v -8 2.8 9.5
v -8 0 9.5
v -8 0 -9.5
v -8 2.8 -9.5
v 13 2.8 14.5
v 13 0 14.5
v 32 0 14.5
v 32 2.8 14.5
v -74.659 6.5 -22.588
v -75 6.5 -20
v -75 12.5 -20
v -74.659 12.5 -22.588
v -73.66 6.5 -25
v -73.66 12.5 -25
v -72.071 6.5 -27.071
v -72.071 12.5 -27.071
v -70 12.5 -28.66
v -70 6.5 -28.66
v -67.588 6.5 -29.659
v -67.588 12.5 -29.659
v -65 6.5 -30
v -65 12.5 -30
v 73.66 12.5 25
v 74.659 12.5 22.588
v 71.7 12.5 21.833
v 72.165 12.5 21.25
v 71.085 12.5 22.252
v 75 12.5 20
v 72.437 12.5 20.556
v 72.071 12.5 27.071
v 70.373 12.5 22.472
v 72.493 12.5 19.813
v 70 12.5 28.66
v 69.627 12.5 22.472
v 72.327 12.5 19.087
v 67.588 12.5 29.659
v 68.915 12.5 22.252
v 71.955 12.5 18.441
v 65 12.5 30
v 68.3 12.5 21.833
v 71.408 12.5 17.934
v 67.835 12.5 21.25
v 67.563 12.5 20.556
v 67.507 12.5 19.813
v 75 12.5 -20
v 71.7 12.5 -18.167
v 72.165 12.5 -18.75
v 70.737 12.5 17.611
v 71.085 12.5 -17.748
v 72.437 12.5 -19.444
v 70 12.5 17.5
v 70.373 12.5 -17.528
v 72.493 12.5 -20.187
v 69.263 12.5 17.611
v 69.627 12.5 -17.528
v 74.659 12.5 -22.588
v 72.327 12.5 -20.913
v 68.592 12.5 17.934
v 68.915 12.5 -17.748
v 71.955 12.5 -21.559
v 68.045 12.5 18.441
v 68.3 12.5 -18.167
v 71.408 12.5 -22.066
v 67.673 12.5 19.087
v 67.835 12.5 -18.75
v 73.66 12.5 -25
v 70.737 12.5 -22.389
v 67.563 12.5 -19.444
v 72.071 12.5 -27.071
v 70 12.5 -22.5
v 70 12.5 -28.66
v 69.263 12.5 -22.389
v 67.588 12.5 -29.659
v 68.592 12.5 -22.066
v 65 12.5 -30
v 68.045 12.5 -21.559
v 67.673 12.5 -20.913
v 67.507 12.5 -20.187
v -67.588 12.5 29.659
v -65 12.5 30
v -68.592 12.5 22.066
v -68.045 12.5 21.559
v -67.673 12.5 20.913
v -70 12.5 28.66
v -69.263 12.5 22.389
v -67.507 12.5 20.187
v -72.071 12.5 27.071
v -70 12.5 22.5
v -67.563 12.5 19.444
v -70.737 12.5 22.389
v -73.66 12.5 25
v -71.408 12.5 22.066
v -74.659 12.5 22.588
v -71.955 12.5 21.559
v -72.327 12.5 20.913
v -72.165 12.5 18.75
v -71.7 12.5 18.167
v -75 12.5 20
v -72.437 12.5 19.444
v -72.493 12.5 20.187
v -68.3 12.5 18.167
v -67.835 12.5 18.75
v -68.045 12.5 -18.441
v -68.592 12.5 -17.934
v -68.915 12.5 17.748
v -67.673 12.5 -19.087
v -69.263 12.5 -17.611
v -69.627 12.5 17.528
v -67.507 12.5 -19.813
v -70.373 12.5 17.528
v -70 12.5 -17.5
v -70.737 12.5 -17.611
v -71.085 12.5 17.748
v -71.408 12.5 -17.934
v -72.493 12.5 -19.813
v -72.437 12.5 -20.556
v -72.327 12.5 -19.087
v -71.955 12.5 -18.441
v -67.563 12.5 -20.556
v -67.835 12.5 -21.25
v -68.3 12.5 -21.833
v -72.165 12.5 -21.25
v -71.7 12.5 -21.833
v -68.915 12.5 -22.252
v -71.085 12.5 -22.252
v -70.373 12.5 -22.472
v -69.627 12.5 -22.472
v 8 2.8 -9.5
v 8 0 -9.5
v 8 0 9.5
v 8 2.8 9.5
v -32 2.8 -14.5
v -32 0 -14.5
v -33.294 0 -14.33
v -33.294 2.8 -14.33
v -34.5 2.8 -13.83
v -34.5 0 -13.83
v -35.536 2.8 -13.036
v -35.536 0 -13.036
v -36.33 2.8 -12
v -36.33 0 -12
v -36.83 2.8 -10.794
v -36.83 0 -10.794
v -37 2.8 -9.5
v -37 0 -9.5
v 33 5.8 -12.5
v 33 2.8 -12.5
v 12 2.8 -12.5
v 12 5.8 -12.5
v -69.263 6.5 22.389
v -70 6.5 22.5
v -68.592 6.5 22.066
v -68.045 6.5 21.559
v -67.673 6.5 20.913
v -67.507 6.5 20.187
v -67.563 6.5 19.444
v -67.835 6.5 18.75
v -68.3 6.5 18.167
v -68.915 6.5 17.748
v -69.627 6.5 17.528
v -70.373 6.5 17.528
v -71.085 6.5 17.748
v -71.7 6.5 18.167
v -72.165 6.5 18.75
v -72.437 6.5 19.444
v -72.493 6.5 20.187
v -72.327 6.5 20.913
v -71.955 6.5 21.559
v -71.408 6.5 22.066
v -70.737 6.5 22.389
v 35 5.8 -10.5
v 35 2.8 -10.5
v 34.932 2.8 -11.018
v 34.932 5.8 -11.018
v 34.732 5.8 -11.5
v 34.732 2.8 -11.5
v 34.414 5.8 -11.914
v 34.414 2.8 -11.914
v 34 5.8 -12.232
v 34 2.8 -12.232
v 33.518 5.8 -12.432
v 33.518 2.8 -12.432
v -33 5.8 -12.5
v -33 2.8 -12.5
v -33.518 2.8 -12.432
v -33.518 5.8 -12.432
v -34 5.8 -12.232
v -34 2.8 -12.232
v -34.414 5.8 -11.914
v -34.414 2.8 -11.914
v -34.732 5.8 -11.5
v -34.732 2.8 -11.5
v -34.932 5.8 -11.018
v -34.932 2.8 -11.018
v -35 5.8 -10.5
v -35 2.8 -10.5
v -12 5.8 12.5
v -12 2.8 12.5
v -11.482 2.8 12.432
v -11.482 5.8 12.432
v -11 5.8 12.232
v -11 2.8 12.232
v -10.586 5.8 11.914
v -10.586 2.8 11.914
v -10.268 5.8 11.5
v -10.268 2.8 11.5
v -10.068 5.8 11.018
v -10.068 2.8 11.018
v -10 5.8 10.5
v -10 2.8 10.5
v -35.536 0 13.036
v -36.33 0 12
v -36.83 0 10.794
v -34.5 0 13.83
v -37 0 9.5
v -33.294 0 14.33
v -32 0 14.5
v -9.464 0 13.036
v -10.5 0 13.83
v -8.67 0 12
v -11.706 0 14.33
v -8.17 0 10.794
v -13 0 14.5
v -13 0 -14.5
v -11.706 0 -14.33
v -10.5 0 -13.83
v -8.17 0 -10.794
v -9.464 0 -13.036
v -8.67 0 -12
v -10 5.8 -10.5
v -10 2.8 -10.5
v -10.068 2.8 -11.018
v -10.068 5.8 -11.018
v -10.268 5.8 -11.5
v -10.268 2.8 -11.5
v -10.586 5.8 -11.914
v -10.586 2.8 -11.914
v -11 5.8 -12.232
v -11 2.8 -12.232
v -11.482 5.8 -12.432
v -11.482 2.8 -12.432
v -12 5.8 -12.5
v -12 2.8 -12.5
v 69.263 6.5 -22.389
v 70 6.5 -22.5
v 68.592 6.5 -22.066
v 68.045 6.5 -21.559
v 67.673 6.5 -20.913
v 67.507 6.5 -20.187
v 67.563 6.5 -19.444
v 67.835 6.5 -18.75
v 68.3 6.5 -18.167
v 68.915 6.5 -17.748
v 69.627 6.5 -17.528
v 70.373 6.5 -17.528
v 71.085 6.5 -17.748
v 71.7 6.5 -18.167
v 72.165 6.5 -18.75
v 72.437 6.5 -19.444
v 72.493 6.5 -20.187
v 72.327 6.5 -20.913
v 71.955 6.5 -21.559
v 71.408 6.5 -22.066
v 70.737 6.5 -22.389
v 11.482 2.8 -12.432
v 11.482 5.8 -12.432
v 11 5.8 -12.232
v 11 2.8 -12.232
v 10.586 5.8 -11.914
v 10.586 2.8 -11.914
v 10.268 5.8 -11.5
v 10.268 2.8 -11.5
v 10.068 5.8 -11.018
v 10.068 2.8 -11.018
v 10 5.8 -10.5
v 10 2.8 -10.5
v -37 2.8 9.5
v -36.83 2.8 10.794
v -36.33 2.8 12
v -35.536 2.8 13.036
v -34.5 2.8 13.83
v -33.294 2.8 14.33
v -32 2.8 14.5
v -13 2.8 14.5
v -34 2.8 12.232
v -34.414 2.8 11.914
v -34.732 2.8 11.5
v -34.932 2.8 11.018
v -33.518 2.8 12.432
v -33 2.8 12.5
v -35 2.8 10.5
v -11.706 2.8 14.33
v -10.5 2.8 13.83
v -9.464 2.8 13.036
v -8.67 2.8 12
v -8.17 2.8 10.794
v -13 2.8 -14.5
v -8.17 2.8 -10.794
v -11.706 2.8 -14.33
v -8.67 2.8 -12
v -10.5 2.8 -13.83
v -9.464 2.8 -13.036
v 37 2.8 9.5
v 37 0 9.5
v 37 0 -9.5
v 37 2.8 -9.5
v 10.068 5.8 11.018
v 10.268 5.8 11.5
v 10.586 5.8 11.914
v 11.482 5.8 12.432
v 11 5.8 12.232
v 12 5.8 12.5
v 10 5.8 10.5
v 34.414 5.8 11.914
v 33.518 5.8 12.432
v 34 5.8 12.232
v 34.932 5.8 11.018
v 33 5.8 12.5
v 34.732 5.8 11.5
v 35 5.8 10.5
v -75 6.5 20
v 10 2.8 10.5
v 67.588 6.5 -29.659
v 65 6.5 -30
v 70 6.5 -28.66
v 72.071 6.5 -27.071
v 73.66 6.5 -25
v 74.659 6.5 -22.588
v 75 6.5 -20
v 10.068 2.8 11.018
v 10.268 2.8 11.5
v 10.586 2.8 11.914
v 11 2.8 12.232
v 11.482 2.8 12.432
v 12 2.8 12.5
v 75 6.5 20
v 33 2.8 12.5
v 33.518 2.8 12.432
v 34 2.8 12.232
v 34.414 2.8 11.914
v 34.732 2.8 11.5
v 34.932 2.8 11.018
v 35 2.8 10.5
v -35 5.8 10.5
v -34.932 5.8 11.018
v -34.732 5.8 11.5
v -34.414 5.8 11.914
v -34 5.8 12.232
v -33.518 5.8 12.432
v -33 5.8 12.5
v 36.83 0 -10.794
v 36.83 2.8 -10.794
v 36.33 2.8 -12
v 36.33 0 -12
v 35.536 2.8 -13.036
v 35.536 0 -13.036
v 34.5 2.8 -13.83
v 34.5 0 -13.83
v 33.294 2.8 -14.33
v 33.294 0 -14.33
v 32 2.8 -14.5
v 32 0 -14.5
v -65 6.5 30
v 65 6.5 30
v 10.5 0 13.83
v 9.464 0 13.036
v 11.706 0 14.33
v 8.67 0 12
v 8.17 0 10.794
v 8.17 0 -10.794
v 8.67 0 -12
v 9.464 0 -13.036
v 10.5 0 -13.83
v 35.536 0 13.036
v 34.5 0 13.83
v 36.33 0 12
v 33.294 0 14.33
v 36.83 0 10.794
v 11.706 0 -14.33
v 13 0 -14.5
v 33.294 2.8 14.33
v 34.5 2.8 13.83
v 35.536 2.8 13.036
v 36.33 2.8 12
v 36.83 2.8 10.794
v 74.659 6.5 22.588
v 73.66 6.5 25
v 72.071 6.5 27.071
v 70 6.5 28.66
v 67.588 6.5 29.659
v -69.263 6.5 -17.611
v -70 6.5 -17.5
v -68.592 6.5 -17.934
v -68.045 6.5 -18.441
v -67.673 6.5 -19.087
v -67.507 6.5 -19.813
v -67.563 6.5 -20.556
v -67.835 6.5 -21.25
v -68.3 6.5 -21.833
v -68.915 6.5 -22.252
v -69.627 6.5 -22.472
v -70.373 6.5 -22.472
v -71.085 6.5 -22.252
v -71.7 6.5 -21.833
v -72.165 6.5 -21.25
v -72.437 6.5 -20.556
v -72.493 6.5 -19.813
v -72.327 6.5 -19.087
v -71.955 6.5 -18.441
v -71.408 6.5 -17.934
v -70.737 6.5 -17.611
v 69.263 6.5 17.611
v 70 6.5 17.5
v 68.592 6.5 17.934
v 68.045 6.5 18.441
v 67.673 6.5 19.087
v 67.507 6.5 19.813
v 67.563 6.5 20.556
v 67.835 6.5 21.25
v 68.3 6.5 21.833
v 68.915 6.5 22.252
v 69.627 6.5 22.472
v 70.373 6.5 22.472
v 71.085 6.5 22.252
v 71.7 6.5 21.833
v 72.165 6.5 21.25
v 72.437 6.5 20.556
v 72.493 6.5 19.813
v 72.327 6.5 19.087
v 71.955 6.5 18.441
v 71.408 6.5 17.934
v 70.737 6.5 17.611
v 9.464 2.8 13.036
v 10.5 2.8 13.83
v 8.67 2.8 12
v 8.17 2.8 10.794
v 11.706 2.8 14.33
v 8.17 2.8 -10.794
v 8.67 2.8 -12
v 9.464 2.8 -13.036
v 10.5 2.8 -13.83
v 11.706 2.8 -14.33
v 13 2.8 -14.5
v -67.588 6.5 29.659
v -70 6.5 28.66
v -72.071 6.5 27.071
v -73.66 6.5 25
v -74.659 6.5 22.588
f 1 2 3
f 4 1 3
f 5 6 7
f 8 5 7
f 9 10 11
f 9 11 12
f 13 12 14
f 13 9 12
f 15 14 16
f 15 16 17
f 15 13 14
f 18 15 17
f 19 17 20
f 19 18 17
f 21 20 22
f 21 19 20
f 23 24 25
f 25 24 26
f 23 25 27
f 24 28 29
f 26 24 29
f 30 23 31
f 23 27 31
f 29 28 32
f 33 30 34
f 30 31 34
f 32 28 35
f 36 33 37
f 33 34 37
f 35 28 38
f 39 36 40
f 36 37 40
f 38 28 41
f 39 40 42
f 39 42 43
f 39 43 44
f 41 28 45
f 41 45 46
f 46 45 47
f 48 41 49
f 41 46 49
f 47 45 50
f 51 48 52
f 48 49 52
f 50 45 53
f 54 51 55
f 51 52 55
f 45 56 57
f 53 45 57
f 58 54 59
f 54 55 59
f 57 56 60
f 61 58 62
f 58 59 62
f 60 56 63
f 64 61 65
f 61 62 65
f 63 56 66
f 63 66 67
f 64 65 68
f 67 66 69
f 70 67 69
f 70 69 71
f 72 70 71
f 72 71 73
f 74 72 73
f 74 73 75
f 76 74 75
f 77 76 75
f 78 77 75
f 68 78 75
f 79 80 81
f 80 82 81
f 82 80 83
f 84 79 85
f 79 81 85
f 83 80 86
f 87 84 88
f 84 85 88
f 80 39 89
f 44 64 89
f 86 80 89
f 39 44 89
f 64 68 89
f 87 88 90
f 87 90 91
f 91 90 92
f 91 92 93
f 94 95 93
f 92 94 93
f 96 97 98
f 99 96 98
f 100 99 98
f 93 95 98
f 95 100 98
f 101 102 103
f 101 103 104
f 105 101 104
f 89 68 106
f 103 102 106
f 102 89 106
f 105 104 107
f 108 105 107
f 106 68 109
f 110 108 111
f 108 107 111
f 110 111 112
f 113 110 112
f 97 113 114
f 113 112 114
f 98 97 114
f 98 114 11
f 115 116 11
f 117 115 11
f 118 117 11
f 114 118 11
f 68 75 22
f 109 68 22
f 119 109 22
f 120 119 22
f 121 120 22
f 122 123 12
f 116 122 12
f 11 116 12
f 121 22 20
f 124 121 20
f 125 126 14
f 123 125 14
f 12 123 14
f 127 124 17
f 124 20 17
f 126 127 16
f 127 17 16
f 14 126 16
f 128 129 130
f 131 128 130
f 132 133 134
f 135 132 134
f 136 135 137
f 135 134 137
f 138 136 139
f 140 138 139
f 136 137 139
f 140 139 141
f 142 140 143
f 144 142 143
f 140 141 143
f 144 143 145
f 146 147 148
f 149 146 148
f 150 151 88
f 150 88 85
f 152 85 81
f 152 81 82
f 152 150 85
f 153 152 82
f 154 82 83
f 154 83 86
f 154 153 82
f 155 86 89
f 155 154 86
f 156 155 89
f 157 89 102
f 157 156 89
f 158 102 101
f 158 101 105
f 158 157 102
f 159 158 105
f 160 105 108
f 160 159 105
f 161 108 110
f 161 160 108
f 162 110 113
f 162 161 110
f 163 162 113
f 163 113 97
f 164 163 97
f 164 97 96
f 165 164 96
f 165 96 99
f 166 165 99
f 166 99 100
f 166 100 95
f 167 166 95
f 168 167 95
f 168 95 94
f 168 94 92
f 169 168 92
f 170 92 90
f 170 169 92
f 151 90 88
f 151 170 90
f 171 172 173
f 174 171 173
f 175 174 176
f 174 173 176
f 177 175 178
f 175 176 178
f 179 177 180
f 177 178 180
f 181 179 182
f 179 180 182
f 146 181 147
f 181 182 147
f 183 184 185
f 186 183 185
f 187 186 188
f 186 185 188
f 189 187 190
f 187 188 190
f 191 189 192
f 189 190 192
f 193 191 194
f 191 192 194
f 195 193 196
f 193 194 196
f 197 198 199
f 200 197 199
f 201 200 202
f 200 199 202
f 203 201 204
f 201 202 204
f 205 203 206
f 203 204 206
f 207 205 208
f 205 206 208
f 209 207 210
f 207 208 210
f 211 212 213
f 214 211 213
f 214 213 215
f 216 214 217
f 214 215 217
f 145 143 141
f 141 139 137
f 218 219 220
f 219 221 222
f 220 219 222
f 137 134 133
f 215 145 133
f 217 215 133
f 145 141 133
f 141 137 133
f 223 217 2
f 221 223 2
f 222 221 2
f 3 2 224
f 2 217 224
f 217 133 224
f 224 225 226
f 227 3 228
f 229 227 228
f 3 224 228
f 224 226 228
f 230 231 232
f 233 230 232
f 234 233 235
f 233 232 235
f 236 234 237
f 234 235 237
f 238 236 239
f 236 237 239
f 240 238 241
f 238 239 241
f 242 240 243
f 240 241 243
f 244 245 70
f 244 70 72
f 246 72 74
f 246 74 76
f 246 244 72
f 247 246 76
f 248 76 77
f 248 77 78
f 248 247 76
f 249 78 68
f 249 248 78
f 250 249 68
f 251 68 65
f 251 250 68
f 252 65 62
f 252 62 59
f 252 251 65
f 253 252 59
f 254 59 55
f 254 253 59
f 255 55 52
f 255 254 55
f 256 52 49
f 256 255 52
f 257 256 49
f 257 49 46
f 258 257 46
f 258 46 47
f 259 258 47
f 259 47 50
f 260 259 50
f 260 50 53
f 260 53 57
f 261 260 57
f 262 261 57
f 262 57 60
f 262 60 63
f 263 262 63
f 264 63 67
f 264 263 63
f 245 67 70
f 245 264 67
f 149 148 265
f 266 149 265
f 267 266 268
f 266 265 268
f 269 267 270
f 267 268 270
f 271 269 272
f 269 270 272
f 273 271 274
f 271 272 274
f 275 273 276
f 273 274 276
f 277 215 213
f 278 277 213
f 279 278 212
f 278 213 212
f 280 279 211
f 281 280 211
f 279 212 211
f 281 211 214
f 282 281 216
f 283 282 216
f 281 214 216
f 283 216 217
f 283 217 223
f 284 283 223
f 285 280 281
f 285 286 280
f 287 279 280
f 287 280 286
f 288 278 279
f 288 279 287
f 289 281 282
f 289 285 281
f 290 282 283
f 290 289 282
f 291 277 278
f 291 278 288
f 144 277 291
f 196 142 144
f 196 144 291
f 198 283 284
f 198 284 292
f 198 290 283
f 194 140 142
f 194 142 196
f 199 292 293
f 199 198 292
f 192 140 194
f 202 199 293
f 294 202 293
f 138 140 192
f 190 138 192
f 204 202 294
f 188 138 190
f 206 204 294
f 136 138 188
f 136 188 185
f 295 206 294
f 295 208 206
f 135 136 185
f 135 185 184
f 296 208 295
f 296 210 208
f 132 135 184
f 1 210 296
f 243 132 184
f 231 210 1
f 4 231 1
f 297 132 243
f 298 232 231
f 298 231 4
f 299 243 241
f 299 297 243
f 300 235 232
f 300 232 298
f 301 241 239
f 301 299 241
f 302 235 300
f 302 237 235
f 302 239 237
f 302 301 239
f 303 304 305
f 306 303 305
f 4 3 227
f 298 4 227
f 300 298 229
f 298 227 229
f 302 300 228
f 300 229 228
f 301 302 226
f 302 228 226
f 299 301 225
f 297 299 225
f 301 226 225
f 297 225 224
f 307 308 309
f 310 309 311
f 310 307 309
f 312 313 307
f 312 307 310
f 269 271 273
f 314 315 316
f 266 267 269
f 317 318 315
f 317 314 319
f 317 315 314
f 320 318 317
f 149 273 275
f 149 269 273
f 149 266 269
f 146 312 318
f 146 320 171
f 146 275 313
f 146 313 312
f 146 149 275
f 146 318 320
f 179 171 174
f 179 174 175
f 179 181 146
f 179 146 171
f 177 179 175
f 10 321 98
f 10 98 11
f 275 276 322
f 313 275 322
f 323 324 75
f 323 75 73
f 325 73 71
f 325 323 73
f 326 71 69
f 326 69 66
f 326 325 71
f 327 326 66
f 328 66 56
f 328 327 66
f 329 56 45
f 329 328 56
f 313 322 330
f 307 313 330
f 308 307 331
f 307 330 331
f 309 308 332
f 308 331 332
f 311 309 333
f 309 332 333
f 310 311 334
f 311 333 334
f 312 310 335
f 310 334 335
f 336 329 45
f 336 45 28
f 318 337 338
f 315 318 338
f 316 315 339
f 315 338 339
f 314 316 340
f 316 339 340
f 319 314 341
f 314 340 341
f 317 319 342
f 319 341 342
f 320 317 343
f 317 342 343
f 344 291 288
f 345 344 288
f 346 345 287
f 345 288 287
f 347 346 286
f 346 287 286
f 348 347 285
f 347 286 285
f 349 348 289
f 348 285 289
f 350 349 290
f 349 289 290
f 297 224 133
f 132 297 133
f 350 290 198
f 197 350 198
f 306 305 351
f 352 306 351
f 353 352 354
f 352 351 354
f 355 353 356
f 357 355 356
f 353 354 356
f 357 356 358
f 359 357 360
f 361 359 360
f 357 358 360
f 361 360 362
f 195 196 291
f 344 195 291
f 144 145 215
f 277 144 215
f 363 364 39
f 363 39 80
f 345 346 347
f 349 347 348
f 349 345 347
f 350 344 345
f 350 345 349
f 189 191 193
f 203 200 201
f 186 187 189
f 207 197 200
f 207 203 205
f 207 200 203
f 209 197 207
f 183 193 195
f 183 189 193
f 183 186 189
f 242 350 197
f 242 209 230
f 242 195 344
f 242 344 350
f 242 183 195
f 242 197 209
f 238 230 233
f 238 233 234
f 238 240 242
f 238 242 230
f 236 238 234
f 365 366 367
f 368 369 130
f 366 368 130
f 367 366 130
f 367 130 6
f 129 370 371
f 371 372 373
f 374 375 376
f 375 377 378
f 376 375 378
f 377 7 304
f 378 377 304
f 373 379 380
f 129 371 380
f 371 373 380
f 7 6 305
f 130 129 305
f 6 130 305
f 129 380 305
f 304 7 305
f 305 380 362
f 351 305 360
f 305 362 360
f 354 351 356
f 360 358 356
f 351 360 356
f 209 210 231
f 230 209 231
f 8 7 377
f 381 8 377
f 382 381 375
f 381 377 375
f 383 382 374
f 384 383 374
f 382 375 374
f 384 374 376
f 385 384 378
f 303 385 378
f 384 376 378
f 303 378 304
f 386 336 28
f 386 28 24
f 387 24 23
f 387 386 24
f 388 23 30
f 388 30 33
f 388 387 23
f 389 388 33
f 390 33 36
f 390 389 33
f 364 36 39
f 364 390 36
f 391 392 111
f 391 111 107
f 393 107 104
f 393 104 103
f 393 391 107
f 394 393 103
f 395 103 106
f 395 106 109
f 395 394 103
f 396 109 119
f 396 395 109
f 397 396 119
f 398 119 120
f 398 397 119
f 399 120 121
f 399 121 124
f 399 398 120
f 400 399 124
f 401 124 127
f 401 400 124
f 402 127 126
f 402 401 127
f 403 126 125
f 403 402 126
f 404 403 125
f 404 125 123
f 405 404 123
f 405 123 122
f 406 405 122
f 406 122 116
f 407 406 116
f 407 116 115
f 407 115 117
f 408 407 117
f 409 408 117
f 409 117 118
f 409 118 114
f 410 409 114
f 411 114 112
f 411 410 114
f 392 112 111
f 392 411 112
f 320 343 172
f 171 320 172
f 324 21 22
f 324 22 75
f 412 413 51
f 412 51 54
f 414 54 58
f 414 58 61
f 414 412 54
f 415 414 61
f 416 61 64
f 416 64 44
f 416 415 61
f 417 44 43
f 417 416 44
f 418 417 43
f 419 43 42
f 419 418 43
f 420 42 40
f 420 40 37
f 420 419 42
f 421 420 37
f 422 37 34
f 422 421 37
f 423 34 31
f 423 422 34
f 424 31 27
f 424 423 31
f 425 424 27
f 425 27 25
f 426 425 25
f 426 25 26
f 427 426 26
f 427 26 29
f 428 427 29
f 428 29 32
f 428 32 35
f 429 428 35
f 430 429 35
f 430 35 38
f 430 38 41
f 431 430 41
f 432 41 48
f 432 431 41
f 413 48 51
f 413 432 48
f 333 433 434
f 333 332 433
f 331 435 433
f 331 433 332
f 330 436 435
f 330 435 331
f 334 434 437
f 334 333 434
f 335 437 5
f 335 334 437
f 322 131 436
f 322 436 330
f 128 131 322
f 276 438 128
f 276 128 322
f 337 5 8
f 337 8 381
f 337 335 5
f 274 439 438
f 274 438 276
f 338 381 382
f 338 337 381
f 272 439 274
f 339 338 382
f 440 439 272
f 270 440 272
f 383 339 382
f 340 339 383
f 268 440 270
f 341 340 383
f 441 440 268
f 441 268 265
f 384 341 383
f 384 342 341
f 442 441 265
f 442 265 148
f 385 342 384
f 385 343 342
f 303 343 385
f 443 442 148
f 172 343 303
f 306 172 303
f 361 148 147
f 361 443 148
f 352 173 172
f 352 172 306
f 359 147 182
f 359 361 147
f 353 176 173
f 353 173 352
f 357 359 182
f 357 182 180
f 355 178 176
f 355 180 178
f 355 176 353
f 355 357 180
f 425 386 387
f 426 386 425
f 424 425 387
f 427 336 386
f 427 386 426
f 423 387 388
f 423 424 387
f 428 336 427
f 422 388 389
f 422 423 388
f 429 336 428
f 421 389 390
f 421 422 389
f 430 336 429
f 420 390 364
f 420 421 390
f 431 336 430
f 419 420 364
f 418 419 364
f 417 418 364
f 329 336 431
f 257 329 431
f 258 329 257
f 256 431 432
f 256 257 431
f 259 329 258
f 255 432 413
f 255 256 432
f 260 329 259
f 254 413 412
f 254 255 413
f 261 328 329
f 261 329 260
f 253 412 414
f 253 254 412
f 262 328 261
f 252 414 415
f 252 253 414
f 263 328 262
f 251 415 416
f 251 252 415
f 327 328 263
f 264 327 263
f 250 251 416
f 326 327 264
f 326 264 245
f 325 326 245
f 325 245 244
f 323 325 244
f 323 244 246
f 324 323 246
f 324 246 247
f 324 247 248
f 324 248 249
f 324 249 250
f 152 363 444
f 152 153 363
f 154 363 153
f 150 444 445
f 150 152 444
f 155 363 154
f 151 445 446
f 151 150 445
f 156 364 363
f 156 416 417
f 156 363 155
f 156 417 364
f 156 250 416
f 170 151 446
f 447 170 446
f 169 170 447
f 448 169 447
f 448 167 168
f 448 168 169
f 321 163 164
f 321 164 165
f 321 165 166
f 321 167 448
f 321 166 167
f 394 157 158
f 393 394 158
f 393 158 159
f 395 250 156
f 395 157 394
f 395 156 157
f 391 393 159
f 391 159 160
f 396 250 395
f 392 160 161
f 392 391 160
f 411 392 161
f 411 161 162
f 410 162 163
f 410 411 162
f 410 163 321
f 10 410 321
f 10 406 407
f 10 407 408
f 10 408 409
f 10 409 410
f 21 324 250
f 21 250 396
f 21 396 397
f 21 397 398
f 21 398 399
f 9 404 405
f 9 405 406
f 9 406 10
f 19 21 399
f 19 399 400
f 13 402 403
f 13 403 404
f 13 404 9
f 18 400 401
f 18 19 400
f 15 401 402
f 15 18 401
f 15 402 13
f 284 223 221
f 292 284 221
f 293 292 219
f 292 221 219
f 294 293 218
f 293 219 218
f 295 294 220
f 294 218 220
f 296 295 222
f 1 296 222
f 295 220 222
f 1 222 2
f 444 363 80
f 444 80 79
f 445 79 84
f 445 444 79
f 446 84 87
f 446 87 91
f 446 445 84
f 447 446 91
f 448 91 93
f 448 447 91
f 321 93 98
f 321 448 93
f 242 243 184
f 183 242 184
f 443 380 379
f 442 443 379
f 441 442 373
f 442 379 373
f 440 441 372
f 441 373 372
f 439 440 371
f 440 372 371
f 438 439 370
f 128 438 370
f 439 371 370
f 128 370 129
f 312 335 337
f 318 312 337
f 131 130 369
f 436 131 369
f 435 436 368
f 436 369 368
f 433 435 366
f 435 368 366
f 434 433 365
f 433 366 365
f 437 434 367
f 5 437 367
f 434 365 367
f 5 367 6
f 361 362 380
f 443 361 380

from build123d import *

# Parameters (mm, degrees)
SALIENTE_EXTRUIR1_DEPTH   = 2.8
SALIENTE_EXTRUIR1_2_DEPTH = 2.8
SALIENTE_EXTRUIR2_DEPTH   = 3
CROQUIS3_R                = 2.5
SALIENTE_EXTRUIR3_DEPTH   = 6


with BuildPart() as part:
    # Croquis1 → Saliente-Extruir1 (new body)
    with BuildSketch(Plane(origin=(0, 0, 0), x_dir=(1, 0, 0), z_dir=(0, 1, 0))):
        with BuildLine():
            Line((-32, -14.5), (-13, -14.5))
            ThreePointArc((-13, -14.5), (-9.464466094, -13.035533906), (-8, -9.5))
            Line((-8, -9.5), (-8, 9.5))
            ThreePointArc((-8, 9.5), (-9.464466094, 13.035533906), (-13, 14.5))
            Line((-13, 14.5), (-32, 14.5))
            ThreePointArc((-32, 14.5), (-35.535533906, 13.035533906), (-37, 9.5))
            Line((-37, 9.5), (-37, -9.5))
            ThreePointArc((-37, -9.5), (-35.535533906, -13.035533906), (-32, -14.5))
        make_face()
    extrude(amount=SALIENTE_EXTRUIR1_DEPTH)



with BuildPart() as body_2:
    # Croquis1 → Saliente-Extruir1 2 (new body)
    with BuildSketch(Plane(origin=(0, 0, 0), x_dir=(1, 0, 0), z_dir=(0, 1, 0))):
        with BuildLine():
            Line((13, -14.5), (32, -14.5))
            ThreePointArc((32, -14.5), (35.535533906, -13.035533906), (37, -9.5))
            Line((37, -9.5), (37, 9.5))
            ThreePointArc((37, 9.5), (35.535533906, 13.035533906), (32, 14.5))
            Line((32, 14.5), (13, 14.5))
            ThreePointArc((13, 14.5), (9.464466094, 13.035533906), (8, 9.5))
            Line((8, 9.5), (8, -9.5))
            ThreePointArc((8, -9.5), (9.464466094, -13.035533906), (13, -14.5))
        make_face()
    extrude(amount=SALIENTE_EXTRUIR1_2_DEPTH)


with BuildPart() as part_1:
    add(part.part)

    add(body_2.part)  # Saliente-Extruir2 merges body 2
    # Croquis2 → Saliente-Extruir2 (add)
    with BuildSketch(Plane(origin=(0, 2.8, 0), x_dir=(1, 0, 0), z_dir=(0, 1, 0))):
        with BuildLine():
            Line((-33, -12.5), (-12, -12.5))
            ThreePointArc((-12, -12.5), (-10.585786438, -11.914213562), (-10, -10.5))
            Line((-10, -10.5), (-10, 10.5))
            ThreePointArc((-10, 10.5), (-10.585786438, 11.914213562), (-12, 12.5))
            Line((-12, 12.5), (-33, 12.5))
            ThreePointArc((-33, 12.5), (-34.414213562, 11.914213562), (-35, 10.5))
            Line((-35, 10.5), (-35, -10.5))
            ThreePointArc((-35, -10.5), (-34.414213562, -11.914213562), (-33, -12.5))
        make_face()
        with BuildLine():
            Line((12, -12.5), (33, -12.5))
            ThreePointArc((33, -12.5), (34.414213562, -11.914213562), (35, -10.5))
            Line((35, -10.5), (35, 10.5))
            ThreePointArc((35, 10.5), (34.414213562, 11.914213562), (33, 12.5))
            Line((33, 12.5), (12, 12.5))
            ThreePointArc((12, 12.5), (10.585786438, 11.914213562), (10, 10.5))
            Line((10, 10.5), (10, -10.5))
            ThreePointArc((10, -10.5), (10.585786438, -11.914213562), (12, -12.5))
        make_face()
    extrude(amount=SALIENTE_EXTRUIR2_DEPTH)


with BuildPart() as body_2_2:
    # Croquis3 → Saliente-Extruir3 (new body)
    with BuildSketch(Plane(origin=(0, 6.5, 0), x_dir=(1, 0, 0), z_dir=(0, 1, 0))):
        with BuildLine():
            Line((65, -30), (-65, -30))
            ThreePointArc((-65, -30), (-72.071067812, -27.071067812), (-75, -20))
            Line((-75, -20), (-75, 20))
            ThreePointArc((-75, 20), (-72.071067812, 27.071067812), (-65, 30))
            Line((-65, 30), (65, 30))
            ThreePointArc((65, 30), (72.071067812, 27.071067812), (75, 20))
            Line((75, 20), (75, -20))
            ThreePointArc((75, -20), (72.071067812, -27.071067812), (65, -30))
        make_face()
        with Locations(Location((-70, 20, 0), (0, 0, 270))):
            Circle(CROQUIS3_R, mode=Mode.SUBTRACT)
        with Locations(Location((-70, -20, 0), (0, 0, 270))):
            Circle(CROQUIS3_R, mode=Mode.SUBTRACT)
        with Locations(Location((70, -20, 0), (0, 0, 90))):
            Circle(CROQUIS3_R, mode=Mode.SUBTRACT)
        with Locations(Location((70, 20, 0), (0, 0, 90))):
            Circle(CROQUIS3_R, mode=Mode.SUBTRACT)
    extrude(amount=SALIENTE_EXTRUIR3_DEPTH)


solid = Compound([part_1.part, body_2_2.part])
